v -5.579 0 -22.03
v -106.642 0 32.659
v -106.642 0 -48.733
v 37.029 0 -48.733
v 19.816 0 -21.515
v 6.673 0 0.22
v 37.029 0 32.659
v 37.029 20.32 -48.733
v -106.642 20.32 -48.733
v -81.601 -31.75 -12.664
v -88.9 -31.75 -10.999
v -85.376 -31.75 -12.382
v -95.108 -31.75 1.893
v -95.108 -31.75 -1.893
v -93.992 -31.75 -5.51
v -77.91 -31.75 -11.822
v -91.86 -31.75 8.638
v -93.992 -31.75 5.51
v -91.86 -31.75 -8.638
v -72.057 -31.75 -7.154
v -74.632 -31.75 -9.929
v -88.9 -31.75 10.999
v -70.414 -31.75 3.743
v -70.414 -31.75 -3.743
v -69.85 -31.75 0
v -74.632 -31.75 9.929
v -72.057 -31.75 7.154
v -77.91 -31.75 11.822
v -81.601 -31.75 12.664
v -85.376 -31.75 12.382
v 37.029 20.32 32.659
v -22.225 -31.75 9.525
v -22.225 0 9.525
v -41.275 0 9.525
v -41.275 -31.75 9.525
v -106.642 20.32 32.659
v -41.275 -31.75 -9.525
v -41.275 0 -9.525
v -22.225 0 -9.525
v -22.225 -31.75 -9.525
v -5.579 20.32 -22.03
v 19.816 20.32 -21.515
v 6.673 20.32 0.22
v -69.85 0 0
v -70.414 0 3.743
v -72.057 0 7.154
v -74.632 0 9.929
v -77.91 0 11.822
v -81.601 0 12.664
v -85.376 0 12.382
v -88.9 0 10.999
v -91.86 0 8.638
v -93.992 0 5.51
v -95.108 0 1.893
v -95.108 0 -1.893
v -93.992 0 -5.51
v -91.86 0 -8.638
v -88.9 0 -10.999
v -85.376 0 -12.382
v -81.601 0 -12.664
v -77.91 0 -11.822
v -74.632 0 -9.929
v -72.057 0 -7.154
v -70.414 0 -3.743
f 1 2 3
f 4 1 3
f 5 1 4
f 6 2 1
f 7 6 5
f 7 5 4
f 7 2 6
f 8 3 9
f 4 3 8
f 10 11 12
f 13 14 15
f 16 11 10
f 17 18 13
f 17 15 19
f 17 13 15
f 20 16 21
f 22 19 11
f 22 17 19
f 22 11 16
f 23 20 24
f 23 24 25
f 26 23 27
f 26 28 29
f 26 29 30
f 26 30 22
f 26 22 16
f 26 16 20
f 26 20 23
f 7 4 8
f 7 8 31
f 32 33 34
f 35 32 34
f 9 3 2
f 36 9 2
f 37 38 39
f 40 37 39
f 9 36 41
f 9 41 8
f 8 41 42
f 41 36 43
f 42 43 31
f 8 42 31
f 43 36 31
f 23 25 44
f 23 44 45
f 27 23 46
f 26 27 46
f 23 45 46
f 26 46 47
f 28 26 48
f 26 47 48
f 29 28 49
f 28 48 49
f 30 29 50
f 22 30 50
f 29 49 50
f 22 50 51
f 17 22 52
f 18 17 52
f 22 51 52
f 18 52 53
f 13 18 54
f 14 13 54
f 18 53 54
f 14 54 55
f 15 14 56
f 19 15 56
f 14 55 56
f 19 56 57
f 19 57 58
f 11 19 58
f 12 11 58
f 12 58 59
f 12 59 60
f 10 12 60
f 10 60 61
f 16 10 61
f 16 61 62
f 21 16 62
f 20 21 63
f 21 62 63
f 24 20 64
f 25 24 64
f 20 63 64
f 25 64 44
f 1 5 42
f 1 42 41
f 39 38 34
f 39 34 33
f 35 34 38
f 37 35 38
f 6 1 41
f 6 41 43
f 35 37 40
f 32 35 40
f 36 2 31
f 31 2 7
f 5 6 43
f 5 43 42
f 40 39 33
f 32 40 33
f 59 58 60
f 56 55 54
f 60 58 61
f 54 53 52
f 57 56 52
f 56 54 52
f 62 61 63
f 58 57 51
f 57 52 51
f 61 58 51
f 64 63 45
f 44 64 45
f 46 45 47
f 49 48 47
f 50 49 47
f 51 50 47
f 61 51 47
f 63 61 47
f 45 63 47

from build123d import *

# Parameters (mm, degrees)
F0_R     = 12.7
F1_DEPTH = 31.75
F0_W     = 143.6709240079
F0_H     = 81.3919715583
F2_DEPTH = 20.32


# Not quite as in the source:
# - a feature names something its author has since deleted; it is built from what else it names


with BuildPart() as f1:
    # F0 (on Front) → F1 (new body)
    with BuildSketch(Plane.XZ):
        with Locations((-82.55, 0)):
            Circle(F0_R)
    extrude(amount=F1_DEPTH)


with BuildPart() as f1b:
    # F0 (on Front) → F1, piece 2 (new body)
    with BuildSketch(Plane.XZ):
        Polygon((-31.75, 0), (-22.225, 0), (-22.225, 9.525), (-41.275, 9.525), (-41.275, 0), align=None)
        Polygon((-22.225, -9.525), (-22.225, 0), (-31.75, 0), (-41.275, 0), (-41.275, -9.525), align=None)
    extrude(amount=F1_DEPTH)


with BuildPart() as f2:
    # F0 (on Front) → F2 (new body)
    with BuildSketch(Plane.XZ):
        with Locations((-34.8065011203, -8.0374795943)):
            Rectangle(F0_W, F0_H)
        Polygon((-5.5785784244, -22.0296108979), (6.6733725689, 0.2201013892), (19.8162131398, -21.5152555605), align=None, mode=Mode.SUBTRACT)
        with Locations((-82.55, 0)):
            Circle(F0_R, mode=Mode.SUBTRACT)
        Polygon((-22.225, 9.525), (-22.225, 0), (-22.225, -9.525), (-41.275, -9.525), (-41.275, 0), (-41.275, 9.525), align=None, mode=Mode.SUBTRACT)
        with Locations((-82.55, 0)):
            Circle(F0_R)
        Polygon((-22.225, -9.525), (-22.225, 0), (-31.75, 0), (-41.275, 0), (-41.275, -9.525), align=None)
        Polygon((-31.75, 0), (-22.225, 0), (-22.225, 9.525), (-41.275, 9.525), (-41.275, 0), align=None)
    extrude(amount=-F2_DEPTH)


solid = Compound([f1.part, f1b.part, f2.part])
